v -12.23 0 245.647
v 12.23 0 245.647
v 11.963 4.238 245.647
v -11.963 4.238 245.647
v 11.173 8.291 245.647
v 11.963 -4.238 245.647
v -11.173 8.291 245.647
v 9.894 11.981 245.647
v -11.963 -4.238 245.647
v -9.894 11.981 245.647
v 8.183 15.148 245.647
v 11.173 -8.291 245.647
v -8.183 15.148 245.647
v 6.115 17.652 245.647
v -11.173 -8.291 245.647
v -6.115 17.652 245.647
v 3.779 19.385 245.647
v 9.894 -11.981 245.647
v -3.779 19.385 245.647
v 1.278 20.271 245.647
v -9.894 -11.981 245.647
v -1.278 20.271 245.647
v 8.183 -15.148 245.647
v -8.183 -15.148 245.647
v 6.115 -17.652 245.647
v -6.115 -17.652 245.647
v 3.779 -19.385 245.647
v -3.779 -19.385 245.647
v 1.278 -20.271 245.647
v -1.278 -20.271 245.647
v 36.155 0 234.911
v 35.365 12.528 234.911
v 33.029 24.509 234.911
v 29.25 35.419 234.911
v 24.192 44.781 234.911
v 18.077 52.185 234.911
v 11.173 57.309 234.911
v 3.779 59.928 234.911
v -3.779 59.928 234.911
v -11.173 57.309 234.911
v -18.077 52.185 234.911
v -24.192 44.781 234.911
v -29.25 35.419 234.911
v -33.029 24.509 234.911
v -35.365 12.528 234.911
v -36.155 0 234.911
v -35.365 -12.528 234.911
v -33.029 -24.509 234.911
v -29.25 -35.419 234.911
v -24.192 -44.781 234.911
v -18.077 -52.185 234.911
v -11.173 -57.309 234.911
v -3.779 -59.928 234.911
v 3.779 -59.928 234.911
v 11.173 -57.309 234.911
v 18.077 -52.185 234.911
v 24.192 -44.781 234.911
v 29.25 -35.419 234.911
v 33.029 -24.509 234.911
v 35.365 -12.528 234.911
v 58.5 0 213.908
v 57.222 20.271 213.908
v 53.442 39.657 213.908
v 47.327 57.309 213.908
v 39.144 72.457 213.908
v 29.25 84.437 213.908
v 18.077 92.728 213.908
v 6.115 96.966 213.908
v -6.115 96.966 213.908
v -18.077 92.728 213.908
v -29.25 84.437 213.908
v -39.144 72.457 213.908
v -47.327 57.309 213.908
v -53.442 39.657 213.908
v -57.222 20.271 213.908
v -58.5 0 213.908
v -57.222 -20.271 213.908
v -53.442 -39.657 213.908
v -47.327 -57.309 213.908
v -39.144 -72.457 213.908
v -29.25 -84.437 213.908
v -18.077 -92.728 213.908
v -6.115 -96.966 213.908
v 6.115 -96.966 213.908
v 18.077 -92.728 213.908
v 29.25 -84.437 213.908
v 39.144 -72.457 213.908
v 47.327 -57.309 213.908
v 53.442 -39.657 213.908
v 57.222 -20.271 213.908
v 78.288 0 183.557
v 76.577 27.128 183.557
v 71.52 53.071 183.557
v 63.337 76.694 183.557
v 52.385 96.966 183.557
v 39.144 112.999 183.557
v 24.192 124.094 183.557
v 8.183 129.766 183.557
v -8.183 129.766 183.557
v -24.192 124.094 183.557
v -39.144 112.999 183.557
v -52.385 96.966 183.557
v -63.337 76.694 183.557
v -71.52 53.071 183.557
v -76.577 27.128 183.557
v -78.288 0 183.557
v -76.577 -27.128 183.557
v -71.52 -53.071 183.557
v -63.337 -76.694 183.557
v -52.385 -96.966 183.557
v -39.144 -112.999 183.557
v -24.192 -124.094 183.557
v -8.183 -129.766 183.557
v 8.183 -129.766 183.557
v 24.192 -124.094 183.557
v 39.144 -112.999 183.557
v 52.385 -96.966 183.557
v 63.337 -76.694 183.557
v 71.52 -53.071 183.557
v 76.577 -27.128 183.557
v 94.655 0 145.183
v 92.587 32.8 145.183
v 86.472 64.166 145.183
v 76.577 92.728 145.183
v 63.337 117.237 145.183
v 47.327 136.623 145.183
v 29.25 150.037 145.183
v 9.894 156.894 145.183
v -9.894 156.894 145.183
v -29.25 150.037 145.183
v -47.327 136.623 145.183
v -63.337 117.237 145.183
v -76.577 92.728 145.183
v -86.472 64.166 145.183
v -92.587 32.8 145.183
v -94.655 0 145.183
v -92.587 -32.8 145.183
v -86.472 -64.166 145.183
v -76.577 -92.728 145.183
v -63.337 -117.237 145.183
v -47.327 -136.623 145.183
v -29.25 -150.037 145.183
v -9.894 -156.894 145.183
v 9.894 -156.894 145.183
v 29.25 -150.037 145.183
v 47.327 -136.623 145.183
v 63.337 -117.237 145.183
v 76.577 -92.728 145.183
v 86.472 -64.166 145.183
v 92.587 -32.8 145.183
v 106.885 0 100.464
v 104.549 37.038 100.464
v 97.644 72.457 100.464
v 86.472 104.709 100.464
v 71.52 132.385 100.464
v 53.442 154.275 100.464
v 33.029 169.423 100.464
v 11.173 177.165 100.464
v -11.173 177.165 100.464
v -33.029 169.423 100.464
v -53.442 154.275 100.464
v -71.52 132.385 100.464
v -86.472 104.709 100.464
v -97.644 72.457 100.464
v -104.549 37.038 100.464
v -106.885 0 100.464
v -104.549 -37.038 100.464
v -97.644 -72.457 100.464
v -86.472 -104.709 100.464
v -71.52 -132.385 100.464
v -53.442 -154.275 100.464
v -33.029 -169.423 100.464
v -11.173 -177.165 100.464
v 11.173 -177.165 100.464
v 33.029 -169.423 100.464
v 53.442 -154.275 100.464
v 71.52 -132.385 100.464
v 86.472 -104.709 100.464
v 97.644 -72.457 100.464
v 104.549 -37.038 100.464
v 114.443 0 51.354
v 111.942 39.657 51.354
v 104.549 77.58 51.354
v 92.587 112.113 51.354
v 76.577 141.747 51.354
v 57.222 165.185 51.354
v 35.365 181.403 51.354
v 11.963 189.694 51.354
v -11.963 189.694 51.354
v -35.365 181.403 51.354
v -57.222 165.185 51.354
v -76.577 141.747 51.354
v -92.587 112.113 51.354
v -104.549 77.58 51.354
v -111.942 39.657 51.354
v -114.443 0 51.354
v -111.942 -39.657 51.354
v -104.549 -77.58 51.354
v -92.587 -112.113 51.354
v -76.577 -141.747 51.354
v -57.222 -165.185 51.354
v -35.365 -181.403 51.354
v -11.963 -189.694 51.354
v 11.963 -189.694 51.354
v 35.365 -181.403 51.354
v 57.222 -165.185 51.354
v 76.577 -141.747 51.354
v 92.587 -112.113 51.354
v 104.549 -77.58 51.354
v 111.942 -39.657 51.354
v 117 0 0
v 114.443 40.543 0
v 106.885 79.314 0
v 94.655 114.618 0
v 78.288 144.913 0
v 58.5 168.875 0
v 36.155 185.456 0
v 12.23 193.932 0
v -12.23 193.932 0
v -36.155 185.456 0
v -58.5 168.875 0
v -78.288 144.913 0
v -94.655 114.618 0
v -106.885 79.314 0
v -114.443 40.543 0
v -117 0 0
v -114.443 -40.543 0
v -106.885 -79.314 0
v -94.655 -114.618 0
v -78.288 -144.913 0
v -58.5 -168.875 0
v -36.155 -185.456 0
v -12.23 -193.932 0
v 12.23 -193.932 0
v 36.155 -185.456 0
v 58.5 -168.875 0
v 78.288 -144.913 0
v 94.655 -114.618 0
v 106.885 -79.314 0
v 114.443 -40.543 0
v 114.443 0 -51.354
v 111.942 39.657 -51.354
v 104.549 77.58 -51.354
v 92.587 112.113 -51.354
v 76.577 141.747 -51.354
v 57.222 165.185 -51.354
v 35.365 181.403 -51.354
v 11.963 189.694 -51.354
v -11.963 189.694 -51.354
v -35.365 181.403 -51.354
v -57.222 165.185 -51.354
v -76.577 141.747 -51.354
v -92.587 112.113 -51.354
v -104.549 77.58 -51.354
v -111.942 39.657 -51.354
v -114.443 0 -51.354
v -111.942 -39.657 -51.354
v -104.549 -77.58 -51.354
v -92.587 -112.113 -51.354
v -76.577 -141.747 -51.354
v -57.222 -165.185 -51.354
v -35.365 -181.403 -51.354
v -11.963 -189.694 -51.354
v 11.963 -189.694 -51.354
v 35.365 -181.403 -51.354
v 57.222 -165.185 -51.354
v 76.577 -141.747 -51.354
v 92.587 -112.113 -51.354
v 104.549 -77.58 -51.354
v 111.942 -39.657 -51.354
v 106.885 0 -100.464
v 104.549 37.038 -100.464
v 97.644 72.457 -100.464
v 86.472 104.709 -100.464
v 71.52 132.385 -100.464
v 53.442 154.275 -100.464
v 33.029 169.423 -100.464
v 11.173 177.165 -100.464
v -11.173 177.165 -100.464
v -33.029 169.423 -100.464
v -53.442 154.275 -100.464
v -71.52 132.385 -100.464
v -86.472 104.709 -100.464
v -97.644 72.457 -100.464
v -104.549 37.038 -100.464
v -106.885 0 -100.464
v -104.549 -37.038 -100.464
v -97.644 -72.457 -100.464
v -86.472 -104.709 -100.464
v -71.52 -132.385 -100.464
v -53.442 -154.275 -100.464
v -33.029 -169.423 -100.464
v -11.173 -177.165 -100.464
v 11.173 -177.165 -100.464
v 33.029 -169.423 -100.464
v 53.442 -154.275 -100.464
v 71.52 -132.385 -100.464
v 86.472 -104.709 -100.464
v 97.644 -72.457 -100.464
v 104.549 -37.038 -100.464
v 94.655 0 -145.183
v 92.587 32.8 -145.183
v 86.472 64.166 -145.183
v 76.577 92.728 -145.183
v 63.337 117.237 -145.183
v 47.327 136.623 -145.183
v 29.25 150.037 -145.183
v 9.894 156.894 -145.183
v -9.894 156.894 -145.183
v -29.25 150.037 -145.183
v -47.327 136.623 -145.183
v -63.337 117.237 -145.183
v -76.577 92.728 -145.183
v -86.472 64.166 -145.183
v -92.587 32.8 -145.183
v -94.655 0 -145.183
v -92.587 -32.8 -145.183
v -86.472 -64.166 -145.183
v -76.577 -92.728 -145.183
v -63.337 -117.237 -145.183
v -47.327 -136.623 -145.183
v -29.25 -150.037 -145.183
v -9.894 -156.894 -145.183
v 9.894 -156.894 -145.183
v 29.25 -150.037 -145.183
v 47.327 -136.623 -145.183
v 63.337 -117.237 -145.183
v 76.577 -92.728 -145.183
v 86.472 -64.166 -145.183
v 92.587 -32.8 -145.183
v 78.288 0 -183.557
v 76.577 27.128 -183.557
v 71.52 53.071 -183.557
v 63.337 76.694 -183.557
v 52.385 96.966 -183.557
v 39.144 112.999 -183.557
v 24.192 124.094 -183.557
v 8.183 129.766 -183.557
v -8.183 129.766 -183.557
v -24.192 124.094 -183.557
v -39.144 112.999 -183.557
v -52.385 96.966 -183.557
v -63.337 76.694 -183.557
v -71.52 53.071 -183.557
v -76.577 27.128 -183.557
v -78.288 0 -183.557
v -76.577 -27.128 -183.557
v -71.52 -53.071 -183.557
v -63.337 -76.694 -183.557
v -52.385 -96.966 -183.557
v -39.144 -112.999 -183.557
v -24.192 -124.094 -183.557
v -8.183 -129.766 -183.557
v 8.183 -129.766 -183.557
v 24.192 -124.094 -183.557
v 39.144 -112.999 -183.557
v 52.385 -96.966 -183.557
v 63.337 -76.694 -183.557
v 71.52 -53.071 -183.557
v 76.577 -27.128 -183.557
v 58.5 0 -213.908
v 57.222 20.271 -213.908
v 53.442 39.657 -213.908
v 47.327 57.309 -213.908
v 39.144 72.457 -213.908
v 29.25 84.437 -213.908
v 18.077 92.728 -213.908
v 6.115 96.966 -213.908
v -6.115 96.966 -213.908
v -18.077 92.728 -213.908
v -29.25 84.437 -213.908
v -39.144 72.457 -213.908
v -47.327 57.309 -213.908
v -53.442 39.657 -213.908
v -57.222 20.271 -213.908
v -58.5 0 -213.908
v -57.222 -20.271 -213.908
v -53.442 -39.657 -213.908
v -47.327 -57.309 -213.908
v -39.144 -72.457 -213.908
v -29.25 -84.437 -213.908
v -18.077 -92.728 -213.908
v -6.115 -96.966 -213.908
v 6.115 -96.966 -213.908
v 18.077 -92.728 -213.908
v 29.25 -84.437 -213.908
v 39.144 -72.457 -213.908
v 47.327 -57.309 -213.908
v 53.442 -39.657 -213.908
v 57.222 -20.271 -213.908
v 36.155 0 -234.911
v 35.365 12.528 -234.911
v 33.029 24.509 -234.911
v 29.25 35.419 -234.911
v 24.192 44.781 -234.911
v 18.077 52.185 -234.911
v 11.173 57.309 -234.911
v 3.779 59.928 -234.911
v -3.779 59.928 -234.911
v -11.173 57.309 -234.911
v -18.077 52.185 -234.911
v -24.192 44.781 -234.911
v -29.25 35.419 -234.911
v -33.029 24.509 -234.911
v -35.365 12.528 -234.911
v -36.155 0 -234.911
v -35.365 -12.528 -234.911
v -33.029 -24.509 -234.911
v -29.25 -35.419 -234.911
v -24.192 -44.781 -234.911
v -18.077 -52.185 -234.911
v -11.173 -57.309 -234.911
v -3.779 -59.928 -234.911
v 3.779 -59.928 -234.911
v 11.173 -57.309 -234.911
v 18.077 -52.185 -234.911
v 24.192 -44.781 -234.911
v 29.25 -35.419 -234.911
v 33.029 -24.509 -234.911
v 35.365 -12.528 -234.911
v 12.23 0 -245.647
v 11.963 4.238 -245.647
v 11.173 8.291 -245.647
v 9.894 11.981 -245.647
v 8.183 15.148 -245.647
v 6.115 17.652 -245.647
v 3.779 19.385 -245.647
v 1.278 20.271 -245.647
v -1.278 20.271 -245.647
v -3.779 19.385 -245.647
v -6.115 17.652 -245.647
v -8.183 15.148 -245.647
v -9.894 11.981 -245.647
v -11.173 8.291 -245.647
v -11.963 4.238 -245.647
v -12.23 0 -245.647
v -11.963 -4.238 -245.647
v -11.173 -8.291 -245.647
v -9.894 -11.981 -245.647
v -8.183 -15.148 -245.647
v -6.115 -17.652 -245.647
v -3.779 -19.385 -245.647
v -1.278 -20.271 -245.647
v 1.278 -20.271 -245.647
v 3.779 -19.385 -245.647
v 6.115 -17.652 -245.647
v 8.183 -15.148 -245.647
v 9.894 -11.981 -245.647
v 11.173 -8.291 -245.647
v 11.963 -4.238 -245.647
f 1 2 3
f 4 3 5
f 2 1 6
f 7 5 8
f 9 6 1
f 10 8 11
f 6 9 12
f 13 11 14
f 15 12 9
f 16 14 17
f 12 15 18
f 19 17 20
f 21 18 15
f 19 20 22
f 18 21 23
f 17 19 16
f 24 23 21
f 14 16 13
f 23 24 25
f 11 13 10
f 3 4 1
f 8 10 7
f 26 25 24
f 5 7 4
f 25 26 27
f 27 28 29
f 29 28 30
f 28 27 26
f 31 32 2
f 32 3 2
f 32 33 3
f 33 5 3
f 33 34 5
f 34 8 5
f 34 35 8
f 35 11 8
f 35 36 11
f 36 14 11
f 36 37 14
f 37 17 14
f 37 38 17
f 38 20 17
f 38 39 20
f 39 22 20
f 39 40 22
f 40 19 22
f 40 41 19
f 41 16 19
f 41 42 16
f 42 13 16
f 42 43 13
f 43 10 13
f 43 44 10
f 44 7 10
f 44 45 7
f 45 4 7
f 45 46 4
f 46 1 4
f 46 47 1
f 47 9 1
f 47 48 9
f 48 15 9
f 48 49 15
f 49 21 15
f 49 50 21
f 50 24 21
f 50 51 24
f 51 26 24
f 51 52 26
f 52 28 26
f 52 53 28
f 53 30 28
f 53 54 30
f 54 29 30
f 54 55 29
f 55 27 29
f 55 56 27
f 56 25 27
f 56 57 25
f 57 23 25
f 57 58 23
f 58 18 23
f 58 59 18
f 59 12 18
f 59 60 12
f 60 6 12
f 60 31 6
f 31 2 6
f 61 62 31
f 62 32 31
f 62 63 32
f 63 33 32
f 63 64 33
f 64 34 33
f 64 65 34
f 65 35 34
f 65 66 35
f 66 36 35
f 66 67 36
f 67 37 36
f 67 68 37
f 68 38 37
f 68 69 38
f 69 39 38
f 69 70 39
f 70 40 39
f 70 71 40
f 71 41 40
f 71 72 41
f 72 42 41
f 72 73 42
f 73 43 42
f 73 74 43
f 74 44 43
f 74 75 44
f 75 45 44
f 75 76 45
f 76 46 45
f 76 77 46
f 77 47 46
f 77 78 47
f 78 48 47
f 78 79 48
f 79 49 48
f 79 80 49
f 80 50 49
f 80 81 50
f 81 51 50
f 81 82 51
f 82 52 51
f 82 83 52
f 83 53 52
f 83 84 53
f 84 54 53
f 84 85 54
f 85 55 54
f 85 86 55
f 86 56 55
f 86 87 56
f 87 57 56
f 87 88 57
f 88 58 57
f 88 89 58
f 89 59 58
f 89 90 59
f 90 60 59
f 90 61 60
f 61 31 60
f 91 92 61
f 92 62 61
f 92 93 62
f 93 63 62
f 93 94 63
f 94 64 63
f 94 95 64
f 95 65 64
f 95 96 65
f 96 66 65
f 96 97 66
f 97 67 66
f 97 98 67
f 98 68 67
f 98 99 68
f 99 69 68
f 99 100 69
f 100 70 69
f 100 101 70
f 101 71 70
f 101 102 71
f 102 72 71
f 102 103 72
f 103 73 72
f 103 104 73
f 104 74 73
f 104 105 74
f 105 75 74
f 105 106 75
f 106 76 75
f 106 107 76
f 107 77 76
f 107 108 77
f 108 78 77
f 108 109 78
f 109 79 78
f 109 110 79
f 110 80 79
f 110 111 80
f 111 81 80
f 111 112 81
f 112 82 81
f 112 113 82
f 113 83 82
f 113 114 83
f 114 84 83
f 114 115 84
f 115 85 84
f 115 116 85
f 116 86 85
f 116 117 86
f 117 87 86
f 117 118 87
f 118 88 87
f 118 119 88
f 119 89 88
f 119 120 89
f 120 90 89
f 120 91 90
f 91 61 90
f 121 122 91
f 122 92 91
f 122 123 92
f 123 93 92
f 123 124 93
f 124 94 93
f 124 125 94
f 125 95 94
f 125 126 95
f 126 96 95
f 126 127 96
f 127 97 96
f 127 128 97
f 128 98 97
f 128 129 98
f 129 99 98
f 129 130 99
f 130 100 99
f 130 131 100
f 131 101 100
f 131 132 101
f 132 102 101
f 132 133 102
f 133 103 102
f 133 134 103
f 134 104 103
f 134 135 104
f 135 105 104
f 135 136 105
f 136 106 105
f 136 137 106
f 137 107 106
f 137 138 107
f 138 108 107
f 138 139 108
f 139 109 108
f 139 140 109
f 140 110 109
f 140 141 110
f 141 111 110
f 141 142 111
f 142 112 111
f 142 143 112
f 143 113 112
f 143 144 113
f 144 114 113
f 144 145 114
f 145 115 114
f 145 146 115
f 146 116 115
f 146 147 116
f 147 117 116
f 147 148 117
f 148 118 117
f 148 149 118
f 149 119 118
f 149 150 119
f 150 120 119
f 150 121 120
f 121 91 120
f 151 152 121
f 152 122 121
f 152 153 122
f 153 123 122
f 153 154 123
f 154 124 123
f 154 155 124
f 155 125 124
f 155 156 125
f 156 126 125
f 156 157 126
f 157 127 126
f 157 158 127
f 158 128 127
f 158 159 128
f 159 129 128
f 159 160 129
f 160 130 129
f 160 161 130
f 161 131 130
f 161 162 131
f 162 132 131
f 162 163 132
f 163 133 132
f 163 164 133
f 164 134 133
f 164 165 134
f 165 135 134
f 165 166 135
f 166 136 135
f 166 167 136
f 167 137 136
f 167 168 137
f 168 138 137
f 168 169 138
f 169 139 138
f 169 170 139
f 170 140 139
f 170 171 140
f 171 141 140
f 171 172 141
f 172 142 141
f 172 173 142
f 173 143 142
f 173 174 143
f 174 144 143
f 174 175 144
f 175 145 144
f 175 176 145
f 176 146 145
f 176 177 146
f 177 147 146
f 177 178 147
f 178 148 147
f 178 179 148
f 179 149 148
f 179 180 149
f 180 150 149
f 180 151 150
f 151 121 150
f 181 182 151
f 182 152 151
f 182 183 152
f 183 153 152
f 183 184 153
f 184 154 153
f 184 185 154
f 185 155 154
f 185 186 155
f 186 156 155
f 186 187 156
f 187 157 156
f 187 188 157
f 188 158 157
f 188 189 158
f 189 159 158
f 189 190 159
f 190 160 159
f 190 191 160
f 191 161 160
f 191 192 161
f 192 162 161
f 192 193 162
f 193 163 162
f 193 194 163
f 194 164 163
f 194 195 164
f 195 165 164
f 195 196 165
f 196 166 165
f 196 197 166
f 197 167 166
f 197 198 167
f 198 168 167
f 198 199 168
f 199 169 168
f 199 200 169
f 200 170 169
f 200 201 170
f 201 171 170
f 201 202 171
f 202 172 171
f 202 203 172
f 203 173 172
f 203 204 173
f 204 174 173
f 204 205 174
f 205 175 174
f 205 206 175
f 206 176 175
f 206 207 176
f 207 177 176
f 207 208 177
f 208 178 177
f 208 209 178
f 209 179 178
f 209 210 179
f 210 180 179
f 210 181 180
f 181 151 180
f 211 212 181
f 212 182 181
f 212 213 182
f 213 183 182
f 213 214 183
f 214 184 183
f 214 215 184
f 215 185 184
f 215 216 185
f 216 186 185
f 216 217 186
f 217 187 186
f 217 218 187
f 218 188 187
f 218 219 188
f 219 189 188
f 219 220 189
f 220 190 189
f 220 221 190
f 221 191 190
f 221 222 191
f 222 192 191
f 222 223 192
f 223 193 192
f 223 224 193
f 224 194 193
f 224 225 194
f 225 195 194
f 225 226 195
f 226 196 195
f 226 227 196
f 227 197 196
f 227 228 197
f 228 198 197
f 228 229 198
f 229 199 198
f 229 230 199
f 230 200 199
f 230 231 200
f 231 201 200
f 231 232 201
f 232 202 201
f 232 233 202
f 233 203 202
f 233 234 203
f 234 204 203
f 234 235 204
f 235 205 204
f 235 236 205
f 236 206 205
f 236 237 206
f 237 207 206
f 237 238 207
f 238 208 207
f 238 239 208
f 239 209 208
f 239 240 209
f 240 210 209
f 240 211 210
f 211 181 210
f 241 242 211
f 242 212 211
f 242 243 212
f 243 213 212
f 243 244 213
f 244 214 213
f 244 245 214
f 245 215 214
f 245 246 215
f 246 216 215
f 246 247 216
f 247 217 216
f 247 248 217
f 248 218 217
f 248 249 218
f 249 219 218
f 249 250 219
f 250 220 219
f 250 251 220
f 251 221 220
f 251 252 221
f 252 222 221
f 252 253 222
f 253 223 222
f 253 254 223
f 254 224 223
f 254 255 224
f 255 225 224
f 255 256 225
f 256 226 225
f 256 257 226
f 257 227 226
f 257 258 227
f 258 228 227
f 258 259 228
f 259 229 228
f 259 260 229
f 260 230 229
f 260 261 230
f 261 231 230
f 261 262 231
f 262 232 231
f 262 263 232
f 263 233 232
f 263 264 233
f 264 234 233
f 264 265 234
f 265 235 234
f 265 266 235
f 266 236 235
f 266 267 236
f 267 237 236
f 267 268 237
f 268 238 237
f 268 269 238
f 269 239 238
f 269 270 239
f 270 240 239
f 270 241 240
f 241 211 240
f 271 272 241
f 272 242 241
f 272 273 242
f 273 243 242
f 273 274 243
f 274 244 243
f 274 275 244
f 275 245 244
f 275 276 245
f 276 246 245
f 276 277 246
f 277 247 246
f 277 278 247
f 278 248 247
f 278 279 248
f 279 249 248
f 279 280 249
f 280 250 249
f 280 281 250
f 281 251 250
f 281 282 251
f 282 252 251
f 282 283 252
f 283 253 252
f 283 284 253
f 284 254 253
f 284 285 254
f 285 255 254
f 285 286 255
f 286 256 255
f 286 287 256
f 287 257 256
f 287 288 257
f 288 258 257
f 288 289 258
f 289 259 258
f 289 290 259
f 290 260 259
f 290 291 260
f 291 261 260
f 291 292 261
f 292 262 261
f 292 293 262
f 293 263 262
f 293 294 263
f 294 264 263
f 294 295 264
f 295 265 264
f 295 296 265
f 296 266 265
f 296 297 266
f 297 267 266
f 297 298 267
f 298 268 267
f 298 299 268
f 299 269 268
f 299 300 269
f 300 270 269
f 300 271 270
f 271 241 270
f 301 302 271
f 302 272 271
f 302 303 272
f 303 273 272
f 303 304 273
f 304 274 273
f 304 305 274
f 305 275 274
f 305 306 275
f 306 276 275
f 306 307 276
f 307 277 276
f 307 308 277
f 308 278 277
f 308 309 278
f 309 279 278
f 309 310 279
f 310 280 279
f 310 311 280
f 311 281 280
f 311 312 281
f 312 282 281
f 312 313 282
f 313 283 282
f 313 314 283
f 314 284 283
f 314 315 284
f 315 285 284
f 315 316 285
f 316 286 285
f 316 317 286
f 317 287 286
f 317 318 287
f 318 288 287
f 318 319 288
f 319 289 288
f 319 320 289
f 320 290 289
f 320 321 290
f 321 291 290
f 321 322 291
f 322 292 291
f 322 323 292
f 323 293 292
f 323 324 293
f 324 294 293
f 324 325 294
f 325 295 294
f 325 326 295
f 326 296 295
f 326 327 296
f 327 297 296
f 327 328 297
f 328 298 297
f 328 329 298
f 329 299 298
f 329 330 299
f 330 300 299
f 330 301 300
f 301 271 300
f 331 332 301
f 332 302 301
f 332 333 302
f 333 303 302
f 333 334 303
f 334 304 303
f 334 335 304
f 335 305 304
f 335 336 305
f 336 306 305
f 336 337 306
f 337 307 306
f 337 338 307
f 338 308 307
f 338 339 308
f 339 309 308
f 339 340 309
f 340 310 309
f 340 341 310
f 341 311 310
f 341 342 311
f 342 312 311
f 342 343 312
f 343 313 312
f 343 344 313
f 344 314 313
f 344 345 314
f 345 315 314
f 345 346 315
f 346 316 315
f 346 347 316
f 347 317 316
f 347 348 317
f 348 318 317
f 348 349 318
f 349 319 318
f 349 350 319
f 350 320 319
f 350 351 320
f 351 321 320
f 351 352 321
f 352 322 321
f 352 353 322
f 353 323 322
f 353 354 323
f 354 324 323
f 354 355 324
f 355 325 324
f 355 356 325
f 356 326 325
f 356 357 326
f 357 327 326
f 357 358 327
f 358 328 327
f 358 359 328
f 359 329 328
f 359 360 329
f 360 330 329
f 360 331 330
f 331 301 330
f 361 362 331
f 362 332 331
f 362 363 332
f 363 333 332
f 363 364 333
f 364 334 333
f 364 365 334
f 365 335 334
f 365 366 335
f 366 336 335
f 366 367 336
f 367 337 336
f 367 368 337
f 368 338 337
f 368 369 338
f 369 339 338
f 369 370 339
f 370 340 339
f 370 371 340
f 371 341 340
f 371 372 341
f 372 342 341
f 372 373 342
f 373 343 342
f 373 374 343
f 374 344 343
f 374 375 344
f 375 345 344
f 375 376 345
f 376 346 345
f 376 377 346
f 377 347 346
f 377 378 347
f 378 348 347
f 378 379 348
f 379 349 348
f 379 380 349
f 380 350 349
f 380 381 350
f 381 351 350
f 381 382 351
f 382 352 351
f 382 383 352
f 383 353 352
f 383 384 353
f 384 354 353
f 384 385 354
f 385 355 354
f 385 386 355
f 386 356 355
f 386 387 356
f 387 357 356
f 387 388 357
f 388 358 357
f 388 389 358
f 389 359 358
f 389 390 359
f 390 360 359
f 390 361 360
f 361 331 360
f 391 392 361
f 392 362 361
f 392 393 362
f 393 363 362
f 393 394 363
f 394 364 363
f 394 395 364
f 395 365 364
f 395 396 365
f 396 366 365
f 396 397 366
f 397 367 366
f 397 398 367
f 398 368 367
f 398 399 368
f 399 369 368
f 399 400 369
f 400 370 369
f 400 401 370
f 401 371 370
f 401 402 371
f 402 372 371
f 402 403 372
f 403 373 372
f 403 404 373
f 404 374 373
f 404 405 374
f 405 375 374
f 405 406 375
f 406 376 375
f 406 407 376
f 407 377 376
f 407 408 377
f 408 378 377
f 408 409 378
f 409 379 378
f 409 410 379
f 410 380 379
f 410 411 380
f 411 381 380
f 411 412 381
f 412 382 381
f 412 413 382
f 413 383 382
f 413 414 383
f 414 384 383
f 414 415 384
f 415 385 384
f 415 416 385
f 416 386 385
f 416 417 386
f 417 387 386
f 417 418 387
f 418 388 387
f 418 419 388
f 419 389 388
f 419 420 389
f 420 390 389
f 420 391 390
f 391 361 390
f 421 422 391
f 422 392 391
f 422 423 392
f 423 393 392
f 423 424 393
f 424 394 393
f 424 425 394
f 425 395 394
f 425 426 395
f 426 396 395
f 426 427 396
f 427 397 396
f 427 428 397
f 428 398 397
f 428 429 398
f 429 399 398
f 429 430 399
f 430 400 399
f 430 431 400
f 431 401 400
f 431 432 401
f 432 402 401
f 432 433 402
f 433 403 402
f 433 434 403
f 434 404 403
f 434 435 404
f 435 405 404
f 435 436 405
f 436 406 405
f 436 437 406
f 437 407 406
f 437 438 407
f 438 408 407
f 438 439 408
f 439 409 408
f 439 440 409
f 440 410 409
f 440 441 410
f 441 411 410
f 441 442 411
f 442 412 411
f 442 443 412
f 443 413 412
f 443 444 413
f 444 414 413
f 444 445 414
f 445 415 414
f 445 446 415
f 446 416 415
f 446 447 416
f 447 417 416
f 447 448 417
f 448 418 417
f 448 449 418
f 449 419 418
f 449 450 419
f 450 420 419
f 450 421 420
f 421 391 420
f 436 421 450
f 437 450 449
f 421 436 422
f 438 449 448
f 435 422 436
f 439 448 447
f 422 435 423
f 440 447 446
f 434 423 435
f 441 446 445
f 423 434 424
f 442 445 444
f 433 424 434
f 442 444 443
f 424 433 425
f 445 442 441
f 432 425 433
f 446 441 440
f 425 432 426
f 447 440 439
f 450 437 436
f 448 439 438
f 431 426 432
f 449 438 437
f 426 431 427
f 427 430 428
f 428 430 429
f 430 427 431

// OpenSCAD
// Generated by SolidPython 1.0.1 on 2020-07-29 00:46:49


scale(v = [9, 15, 19]) {
	sphere(r = 13);
}
/***********************************************
*********      SolidPython code:      **********
************************************************
 
# import packages: SolidPython
from solid import *
from solid.utils import *
from itertools import chain, combinations, permutations


class Resize:

    def __init__(self, scad_file):
        self.scad_file = scad_file
        #self.scad_file = import_scad(scad_file)
        # cone/cylinder param:
        self.r1 = 0
        self.r2 = 0
        self.h = 0
        # rectangular prism param:
        self.w = 0
        self.l = 0
        # ellipse param:
        self.r = 0

    # import OpenScad code (file name corresponds to shape)


    # classify shape + parameters
    def assign(self, param1, param2, param3):
        if self.scad_file == 'cone.scad':
            self.r1 = param1
            self.r2 = param2
            self.h = param3
        elif self.scad_file == 'cylinder.scad':
            self.r1 = param1
            self.r2 = param2
            self.h = param3
        elif self.scad_file == 'rectangularPrism.scad':
            self.h = param1
            self.l = param2
            self.w = param3
        else:
            self.r = param1
            self.h = param2

    # resize parameters
    def iterate(self):
        x = range(3, 20, 2)
        i = 1
        if self.scad_file == 'cone.scad':
            tempList = list(permutations(x, 2))
            for temp in tempList:
                param1 = temp[0]
                param2 = temp[1]
                filepath = 'produced_scad_files/' + 'cone' + str(param1) + '_' + str(param2) + '_' + '.scad'
                scad_render_to_file(cylinder(h=param1, r1=param2, r2=0), filepath)

        elif self.scad_file == 'cylinder.scad':
            tempList = list(permutations(x, 3))
            for temp in tempList:
                param1 = temp[0]
                param2 = temp[1]
                filepath = 'produced_scad_files/' + 'cylinder' + str(param1) + '_' + str(param2) + '_' + '.scad'
                scad_render_to_file(cylinder(h=param1, r1=param2, r2=param2), filepath)

        elif self.scad_file == 'rectangularPrism.scad':
            tempList = list(permutations(x, 3))
            for temp in tempList:
                param1 = temp[0]
                param2 = temp[1]
                param3 = temp[2]
                filepath = 'produced_scad_files/' + 'rectangularPrism' + str(param1) + '_' + str(param2) + '_' + str(
                    param3) + '.scad'
                scad_render_to_file(cube(size=(param1, param2, param3)), filepath)

        elif self.scad_file == 'ellipse.scad':
            tempList = list(permutations(x, 4))
            for temp in tempList:
                param1 = temp[0]
                param2 = temp[1]
                param3 = temp[2]
                param4 = temp[3]
                filepath = 'produced_scad_files/' + 'ellipse' + str(param1) + '_' + str(param2) + '_' + str(param3) + '_' + str(param4) + '.scad'
                scad_render_to_file(scale([param1, param2, param3])(sphere(r=param4)), filepath)

    def render_to_scadfile(self):
        scad_render_to_file(scad, 'example.scad') 
 
************************************************/
